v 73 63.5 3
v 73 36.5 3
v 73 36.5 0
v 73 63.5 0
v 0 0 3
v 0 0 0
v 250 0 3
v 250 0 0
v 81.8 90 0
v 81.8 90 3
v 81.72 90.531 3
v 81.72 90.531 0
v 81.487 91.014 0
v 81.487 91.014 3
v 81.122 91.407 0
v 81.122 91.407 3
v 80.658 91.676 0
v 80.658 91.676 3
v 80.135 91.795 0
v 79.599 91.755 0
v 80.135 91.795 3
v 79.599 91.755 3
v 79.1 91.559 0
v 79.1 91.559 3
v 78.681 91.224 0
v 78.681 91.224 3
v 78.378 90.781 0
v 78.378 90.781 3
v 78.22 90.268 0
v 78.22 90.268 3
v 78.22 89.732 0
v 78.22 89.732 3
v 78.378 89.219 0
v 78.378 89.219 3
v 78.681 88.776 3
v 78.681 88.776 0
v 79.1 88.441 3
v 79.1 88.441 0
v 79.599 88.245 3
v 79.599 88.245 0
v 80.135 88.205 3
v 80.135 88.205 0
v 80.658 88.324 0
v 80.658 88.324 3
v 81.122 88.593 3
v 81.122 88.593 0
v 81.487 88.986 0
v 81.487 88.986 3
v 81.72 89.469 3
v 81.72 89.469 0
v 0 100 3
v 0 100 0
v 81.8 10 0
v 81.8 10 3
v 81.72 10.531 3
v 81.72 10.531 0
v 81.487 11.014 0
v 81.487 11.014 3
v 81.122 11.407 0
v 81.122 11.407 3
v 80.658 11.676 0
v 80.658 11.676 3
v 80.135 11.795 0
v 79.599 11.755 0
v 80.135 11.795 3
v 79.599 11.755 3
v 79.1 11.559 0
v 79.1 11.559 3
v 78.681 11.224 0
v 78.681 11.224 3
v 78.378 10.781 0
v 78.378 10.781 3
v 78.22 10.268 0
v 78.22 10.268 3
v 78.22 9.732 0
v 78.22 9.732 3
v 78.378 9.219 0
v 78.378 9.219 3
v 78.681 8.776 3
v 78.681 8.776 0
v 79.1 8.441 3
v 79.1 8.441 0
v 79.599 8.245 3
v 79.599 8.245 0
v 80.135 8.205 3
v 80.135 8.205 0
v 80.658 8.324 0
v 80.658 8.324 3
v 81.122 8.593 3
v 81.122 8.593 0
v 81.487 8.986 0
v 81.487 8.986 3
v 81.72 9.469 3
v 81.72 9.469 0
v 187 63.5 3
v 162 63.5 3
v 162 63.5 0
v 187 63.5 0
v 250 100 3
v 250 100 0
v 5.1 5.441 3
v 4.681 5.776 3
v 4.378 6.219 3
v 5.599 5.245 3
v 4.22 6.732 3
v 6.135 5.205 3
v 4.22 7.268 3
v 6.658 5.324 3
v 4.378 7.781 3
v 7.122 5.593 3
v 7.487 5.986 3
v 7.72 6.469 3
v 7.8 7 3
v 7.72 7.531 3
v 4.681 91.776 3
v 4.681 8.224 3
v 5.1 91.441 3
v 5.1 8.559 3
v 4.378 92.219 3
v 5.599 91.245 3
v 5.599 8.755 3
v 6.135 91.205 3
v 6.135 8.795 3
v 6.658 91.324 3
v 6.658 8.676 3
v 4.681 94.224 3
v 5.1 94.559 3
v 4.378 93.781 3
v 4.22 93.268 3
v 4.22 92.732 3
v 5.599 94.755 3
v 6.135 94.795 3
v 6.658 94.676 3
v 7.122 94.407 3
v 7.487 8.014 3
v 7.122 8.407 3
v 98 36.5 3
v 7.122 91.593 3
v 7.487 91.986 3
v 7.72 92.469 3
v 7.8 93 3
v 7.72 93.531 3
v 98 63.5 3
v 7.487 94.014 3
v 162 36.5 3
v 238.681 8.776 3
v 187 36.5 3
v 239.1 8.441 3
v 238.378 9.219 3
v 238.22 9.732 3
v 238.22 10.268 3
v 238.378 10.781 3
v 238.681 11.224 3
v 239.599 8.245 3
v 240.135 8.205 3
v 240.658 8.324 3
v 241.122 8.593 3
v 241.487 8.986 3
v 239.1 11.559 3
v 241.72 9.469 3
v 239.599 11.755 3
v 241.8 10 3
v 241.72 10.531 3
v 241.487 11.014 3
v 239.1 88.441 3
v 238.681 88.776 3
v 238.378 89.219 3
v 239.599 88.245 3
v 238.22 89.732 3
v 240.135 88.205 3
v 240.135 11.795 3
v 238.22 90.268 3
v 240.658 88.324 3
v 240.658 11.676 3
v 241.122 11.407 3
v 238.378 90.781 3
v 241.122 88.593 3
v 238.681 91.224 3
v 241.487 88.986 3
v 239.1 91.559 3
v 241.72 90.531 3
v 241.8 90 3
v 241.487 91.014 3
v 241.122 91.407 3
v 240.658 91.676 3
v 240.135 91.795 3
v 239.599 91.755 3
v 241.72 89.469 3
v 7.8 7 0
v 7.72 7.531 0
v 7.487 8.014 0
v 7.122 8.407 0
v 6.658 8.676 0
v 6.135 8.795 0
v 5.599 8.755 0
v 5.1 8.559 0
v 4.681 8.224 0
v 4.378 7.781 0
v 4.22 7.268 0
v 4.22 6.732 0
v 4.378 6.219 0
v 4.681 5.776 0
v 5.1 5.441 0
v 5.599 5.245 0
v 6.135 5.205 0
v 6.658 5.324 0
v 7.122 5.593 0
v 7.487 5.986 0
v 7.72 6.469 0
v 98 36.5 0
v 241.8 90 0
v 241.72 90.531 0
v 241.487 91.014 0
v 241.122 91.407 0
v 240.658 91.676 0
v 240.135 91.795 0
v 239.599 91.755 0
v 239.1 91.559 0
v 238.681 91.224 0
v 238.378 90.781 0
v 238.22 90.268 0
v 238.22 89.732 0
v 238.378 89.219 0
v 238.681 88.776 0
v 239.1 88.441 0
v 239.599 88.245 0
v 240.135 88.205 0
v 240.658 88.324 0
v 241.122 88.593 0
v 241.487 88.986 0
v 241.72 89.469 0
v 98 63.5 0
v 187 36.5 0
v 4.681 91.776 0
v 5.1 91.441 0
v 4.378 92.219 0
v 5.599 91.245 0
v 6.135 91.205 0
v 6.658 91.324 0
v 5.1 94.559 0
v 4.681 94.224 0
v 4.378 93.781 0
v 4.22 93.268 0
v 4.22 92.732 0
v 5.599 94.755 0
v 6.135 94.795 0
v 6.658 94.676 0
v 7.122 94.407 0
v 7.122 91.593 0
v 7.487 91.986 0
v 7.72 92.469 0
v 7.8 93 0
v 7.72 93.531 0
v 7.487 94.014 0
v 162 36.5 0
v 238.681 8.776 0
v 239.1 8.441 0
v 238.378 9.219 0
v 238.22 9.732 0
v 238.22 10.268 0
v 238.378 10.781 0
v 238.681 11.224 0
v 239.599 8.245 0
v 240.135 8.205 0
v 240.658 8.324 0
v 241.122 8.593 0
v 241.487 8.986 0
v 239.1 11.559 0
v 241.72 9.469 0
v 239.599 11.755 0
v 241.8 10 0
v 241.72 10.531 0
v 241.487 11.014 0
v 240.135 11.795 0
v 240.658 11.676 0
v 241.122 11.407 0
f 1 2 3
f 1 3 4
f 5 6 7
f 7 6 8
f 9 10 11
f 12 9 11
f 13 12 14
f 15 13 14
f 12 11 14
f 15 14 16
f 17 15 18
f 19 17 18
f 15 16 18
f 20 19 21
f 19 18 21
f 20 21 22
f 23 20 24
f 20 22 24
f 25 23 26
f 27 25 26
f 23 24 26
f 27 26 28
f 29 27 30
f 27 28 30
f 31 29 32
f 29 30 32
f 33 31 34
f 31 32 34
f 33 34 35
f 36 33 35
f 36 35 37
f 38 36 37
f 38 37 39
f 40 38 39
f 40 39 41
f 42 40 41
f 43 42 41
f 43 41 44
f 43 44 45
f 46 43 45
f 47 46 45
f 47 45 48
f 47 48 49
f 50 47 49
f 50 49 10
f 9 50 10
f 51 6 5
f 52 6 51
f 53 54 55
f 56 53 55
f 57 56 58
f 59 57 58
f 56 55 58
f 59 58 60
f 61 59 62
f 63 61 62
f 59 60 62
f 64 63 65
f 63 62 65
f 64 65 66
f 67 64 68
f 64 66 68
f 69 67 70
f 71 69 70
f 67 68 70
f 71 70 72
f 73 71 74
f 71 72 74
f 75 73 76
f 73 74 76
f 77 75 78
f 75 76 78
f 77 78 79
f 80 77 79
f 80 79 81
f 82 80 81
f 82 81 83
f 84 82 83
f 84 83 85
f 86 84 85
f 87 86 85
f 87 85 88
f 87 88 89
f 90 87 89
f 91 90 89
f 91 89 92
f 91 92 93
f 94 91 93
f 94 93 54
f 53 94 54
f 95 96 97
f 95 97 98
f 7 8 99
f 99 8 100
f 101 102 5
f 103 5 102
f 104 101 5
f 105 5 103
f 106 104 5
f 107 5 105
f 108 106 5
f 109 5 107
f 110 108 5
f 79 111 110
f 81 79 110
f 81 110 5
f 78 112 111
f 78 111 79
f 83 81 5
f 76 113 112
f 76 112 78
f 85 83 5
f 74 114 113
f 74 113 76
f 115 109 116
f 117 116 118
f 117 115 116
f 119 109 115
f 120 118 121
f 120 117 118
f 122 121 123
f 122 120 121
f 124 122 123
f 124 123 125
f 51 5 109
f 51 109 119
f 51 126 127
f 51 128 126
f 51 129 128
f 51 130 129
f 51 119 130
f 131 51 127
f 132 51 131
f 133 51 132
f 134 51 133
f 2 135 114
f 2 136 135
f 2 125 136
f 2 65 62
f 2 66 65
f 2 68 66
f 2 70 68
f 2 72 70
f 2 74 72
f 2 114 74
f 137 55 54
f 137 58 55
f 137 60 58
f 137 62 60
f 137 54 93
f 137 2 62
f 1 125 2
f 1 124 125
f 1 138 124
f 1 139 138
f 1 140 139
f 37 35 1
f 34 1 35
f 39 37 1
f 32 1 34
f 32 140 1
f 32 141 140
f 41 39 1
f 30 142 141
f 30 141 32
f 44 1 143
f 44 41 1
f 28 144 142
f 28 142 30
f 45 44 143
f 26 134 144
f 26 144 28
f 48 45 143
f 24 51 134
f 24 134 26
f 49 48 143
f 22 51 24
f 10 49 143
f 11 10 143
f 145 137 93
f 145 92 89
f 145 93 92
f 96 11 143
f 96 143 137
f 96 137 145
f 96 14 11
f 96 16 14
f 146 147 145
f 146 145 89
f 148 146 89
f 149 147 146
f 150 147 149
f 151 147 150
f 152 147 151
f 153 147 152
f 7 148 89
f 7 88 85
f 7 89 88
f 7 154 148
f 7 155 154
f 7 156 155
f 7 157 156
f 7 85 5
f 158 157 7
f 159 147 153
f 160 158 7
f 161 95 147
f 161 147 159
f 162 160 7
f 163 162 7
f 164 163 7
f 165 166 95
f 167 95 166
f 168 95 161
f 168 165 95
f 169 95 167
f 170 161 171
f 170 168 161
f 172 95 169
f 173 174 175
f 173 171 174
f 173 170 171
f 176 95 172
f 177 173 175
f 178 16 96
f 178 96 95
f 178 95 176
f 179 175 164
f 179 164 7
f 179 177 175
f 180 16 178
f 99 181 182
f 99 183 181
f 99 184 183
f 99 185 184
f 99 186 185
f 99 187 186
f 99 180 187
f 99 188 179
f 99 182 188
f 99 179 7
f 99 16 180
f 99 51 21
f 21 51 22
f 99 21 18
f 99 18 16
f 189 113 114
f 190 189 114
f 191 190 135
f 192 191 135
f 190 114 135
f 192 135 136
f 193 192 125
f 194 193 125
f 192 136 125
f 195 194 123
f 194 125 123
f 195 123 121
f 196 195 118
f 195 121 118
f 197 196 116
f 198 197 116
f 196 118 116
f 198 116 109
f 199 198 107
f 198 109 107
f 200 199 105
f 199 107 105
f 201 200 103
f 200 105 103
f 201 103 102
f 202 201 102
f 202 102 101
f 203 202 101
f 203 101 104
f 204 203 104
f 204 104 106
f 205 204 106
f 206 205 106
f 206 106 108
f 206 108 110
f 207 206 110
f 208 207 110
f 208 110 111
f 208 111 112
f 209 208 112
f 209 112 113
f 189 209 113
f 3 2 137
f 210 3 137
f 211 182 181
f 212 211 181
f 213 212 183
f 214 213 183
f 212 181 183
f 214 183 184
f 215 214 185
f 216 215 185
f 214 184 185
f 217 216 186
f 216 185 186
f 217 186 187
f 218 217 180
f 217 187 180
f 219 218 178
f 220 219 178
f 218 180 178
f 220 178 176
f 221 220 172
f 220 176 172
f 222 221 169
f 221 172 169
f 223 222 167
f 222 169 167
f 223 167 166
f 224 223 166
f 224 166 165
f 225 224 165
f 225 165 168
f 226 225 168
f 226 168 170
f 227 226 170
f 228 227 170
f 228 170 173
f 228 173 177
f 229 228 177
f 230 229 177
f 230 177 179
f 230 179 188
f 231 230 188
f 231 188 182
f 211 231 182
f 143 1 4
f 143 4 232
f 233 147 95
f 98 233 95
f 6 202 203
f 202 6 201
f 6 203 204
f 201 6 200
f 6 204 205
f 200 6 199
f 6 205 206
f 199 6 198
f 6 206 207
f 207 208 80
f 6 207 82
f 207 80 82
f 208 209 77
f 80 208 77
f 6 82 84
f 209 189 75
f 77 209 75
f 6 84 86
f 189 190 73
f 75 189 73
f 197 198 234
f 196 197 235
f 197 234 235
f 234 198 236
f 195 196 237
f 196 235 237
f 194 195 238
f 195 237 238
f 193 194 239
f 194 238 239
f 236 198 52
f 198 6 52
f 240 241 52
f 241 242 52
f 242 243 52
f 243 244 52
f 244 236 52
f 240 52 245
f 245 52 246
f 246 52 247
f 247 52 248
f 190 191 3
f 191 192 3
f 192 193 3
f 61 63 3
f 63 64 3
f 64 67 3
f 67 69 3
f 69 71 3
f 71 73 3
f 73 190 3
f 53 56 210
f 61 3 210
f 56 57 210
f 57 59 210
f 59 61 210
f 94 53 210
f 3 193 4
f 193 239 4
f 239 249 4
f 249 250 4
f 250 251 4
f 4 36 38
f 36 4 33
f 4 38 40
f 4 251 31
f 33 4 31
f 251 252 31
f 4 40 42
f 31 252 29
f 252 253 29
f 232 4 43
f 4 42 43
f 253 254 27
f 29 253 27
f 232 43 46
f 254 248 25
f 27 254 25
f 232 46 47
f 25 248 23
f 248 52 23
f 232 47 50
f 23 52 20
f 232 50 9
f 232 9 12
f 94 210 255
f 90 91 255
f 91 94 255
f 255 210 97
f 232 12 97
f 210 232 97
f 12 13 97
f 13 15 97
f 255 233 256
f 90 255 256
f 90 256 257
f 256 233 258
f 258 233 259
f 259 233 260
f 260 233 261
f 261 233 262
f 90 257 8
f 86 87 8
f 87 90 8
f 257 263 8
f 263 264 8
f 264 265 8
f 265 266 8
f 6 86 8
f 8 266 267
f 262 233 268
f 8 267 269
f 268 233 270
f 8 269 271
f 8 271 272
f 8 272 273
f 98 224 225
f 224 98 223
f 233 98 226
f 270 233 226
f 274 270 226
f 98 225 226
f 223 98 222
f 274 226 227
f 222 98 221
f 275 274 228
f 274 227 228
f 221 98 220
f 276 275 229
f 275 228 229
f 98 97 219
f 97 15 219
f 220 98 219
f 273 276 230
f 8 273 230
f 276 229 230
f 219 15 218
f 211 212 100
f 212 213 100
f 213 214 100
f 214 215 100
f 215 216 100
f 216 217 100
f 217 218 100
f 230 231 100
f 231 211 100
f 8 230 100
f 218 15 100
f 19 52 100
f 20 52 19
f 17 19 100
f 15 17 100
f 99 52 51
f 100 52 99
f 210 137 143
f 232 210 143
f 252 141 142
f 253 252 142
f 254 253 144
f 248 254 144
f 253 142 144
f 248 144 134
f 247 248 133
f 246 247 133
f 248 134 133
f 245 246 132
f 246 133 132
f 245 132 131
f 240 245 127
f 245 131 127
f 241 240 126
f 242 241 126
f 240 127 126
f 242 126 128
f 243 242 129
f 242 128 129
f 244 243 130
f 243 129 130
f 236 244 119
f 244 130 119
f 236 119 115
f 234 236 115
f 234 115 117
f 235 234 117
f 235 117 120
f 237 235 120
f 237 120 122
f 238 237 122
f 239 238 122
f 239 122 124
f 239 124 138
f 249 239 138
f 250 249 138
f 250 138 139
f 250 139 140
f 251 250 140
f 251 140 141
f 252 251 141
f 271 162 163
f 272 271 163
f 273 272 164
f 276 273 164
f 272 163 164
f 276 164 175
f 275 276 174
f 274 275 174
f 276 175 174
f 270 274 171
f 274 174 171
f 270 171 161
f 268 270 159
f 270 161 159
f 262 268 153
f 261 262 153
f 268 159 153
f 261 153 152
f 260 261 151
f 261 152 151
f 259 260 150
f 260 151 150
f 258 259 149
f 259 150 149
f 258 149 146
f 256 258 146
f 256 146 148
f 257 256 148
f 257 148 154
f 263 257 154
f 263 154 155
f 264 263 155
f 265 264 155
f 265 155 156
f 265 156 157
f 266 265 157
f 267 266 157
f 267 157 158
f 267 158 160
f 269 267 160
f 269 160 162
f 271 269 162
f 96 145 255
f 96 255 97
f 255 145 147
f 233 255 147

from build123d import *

# Parameters (mm, degrees)
SKETCH1_W           = 250
SKETCH1_H           = 100
BOSS_EXTRUDE1_DEPTH = 3
SKETCH2_R           = 1.8
CUT_EXTRUDE1_DEPTH  = 4
SKETCH3_W           = 25
SKETCH3_H           = 27
CUT_EXTRUDE2_DEPTH  = 4


with BuildPart() as part:
    # Sketch1 → Boss-Extrude1 (new body)
    with BuildSketch(Plane.XY):
        with Locations((125, 50)):
            Rectangle(SKETCH1_W, SKETCH1_H)
    extrude(amount=BOSS_EXTRUDE1_DEPTH)

    # Sketch2 → Cut-Extrude1 (cut, through all)
    with BuildSketch(Plane.XY.offset(3)):
        with Locations((6, 93)):
            Circle(SKETCH2_R)
        with Locations((80, 90)):
            Circle(SKETCH2_R)
        with Locations((240, 90)):
            Circle(SKETCH2_R)
        with Locations((240, 10)):
            Circle(SKETCH2_R)
        with Locations((80, 10)):
            Circle(SKETCH2_R)
        with Locations((6, 7)):
            Circle(SKETCH2_R)
    extrude(amount=-CUT_EXTRUDE1_DEPTH, mode=Mode.SUBTRACT)

    # Sketch3 → Cut-Extrude2 (cut, through all)
    with BuildSketch(Plane.XY.offset(3)):
        with Locations((85.5, 50)):
            Rectangle(SKETCH3_W, SKETCH3_H)
        with Locations((174.5, 50)):
            Rectangle(SKETCH3_W, SKETCH3_H)
    extrude(amount=-CUT_EXTRUDE2_DEPTH, mode=Mode.SUBTRACT)


solid = part.part
